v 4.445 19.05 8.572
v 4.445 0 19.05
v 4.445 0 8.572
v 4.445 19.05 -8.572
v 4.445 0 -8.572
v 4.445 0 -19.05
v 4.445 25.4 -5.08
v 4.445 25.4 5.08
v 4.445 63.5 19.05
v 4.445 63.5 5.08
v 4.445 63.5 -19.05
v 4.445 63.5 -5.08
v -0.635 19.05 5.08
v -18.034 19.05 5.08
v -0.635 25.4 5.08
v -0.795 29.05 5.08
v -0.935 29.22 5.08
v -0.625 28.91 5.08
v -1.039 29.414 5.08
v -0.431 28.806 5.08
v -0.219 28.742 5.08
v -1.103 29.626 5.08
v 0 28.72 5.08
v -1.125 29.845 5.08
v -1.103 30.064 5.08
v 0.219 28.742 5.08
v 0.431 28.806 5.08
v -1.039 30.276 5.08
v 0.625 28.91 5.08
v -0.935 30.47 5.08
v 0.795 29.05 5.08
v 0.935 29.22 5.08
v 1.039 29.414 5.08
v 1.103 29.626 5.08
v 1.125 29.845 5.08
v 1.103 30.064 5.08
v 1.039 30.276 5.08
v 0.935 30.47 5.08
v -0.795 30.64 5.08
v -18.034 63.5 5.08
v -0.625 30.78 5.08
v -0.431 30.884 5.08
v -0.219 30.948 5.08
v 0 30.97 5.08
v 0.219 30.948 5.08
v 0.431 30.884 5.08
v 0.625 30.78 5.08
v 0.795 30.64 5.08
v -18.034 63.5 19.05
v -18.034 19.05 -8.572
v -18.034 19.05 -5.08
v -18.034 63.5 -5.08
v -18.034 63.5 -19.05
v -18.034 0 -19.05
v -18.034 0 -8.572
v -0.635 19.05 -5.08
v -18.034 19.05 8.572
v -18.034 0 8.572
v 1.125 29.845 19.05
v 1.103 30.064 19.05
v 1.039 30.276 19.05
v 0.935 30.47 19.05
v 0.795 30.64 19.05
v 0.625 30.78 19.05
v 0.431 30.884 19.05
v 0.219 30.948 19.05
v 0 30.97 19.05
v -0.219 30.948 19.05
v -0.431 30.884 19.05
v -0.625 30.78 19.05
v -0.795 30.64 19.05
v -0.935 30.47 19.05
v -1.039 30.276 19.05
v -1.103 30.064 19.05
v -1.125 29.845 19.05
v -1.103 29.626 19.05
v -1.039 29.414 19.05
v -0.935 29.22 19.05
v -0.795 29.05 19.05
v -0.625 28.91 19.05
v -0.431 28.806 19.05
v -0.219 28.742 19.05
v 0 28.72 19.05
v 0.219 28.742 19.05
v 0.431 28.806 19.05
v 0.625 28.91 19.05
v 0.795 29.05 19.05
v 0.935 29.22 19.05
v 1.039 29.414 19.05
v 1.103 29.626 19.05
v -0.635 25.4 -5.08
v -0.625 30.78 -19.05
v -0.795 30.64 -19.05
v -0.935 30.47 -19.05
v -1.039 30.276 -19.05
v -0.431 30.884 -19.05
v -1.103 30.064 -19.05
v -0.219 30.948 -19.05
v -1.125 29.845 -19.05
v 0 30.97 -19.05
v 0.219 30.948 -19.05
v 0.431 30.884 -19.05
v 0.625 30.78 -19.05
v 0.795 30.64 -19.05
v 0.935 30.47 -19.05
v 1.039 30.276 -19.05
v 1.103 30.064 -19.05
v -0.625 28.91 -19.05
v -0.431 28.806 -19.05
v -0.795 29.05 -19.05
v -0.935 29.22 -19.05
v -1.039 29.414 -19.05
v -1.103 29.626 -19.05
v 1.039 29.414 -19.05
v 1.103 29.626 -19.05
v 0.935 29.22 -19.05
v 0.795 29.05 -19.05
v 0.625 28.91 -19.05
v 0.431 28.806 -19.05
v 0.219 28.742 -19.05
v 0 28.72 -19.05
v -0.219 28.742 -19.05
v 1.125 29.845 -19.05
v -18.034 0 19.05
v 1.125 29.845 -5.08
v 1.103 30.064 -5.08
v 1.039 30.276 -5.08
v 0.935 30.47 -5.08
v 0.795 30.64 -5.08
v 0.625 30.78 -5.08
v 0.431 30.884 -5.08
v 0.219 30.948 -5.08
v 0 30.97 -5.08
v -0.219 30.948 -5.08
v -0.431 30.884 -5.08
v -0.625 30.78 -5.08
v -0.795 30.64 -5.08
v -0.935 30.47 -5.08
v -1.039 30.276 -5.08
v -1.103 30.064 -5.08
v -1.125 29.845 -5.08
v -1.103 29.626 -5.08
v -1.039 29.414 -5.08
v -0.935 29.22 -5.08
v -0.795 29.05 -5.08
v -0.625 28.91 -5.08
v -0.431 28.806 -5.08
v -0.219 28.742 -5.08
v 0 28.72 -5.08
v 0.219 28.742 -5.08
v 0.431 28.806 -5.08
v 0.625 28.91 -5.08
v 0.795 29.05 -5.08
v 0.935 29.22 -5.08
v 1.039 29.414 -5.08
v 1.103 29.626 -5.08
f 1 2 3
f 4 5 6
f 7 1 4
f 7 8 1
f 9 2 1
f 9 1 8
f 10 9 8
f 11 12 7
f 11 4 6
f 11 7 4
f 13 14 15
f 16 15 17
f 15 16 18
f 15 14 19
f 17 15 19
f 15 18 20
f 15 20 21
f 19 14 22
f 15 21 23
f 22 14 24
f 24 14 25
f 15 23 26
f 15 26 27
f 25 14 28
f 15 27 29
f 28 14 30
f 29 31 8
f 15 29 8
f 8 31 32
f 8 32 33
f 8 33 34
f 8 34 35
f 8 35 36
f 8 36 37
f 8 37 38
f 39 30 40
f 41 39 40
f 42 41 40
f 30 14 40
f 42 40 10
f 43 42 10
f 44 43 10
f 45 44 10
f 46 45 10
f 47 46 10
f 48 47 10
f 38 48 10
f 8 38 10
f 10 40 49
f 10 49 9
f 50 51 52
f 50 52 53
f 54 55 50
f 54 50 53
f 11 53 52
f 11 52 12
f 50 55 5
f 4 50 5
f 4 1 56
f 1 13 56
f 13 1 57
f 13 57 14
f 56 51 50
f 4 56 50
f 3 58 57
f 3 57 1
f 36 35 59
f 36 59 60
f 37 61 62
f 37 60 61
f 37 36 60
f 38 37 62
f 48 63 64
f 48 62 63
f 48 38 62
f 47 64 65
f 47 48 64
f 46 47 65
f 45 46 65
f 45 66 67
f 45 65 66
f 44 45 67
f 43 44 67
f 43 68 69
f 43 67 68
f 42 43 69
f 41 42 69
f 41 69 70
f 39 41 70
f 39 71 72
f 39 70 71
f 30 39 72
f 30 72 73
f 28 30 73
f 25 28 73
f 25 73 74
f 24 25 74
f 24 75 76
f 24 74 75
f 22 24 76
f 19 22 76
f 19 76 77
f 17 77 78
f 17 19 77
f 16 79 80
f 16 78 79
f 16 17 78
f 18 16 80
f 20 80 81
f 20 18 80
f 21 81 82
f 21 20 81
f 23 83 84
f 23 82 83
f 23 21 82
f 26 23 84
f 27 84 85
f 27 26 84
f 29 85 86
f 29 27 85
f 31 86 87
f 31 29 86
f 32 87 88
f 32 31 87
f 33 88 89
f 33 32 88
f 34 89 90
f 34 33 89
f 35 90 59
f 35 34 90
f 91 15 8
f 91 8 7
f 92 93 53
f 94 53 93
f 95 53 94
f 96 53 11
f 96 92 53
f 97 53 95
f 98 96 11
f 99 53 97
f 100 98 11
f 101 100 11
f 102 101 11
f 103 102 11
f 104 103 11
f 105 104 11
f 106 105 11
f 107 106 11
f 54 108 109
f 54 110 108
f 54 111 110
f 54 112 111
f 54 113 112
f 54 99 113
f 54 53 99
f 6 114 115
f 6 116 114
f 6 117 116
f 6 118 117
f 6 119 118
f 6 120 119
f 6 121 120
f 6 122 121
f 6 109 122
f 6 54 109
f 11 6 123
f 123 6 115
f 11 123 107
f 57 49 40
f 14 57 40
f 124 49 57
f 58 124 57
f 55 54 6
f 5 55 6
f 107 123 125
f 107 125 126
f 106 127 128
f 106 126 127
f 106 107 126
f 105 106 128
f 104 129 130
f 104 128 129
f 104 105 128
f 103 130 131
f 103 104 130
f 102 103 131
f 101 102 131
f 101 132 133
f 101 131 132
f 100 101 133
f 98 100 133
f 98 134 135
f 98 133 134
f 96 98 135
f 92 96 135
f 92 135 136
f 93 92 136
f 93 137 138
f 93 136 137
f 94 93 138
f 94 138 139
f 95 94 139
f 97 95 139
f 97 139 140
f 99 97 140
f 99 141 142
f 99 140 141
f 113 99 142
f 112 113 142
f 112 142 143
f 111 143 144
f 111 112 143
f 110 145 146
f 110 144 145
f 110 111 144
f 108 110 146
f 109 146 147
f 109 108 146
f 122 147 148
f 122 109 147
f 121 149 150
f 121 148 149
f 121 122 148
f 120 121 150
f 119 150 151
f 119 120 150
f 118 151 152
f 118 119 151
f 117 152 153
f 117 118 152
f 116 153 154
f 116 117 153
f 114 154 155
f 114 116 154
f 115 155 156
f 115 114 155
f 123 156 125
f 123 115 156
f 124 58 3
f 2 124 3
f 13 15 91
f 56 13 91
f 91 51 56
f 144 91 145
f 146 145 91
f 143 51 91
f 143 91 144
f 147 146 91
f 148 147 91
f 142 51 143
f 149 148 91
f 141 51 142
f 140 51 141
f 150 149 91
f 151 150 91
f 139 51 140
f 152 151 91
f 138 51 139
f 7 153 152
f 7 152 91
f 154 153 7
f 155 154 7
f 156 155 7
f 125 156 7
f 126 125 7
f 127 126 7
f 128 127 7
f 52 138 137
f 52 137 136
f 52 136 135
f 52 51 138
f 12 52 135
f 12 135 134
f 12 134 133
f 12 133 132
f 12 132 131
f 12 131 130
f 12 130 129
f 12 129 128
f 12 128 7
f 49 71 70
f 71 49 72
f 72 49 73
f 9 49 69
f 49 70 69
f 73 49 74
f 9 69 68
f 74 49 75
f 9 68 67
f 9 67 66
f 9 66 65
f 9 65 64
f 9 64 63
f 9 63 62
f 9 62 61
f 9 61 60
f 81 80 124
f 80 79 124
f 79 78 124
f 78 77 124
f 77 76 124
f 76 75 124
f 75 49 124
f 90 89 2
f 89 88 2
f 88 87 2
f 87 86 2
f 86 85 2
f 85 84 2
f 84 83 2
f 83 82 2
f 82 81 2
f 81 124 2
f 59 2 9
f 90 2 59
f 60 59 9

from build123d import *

# Parameters (mm, degrees)
SKETCH1_W               = 36.068
SKETCH1_H               = 38.1
BOSS_EXTRUDE1_DEPTH     = 63.5
SKETCH3_W               = 36.068
SKETCH3_H               = 10.16
CUT_EXTRUDE1_DEPTH      = 38.1
SKETCH4_W               = 36.068
SKETCH4_H               = 17.145
CUT_EXTRUDE2_DEPTH      = 19.05
SKETCH5_W               = 17.399
SKETCH5_H               = 10.16
CUT_EXTRUDE3_DEPTH      = 47.257298408
CUT_EXTRUDE4_DEPTH      = 71.283227416
CUT_EXTRUDE4_DEPTH_BACK = 71.283227416
SKETCH6_R               = 1.125
SKETCH7_W               = 13.589
SKETCH7_H               = 38.1
CUT_EXTRUDE6_DEPTH      = 69.705004592
SKETCH8_W               = 10.16
SKETCH8_H               = 6.35
BOSS_EXTRUDE2_DEPTH     = 3.81


with BuildPart() as part:
    # Sketch1 → Boss-Extrude1 (new body)
    with BuildSketch(Plane(origin=(0, 0, 0), x_dir=(1, 0, 0), z_dir=(0, 1, 0))):
        Rectangle(SKETCH1_W, SKETCH1_H)
    extrude(amount=BOSS_EXTRUDE1_DEPTH)

    # Sketch3 → Cut-Extrude1 (cut)
    with BuildSketch(Plane(origin=(0, 63.5, 0), x_dir=(1, 0, 0), z_dir=(0, 1, 0))):
        Rectangle(SKETCH3_W, SKETCH3_H)
    extrude(amount=-CUT_EXTRUDE1_DEPTH, mode=Mode.SUBTRACT)

    # Sketch4 → Cut-Extrude2 (cut)
    with BuildSketch(Plane.XZ):
        Rectangle(SKETCH4_W, SKETCH4_H)
    extrude(amount=-CUT_EXTRUDE2_DEPTH, mode=Mode.SUBTRACT)

    # Sketch5 → Cut-Extrude3 (cut, through all)
    with BuildSketch(Plane(origin=(0, 25.4, 0), x_dir=(1, 0, 0), z_dir=(0, 1, 0))):
        with Locations((-9.3345, 0)):
            Rectangle(SKETCH5_W, SKETCH5_H)
        with Locations((9.3345, 0)):
            Rectangle(SKETCH5_W, SKETCH5_H)
    extrude(amount=-CUT_EXTRUDE3_DEPTH, mode=Mode.SUBTRACT)

    # Sketch6 → Cut-Extrude4 (cut, two sides: drawn at the far end of the back side and taken through both)
    with BuildSketch(Plane.XY.offset(-5.08).offset(-CUT_EXTRUDE4_DEPTH_BACK)):
        with Locations((0, 29.845)):
            Circle(SKETCH6_R)
    extrude(amount=CUT_EXTRUDE4_DEPTH + CUT_EXTRUDE4_DEPTH_BACK, mode=Mode.SUBTRACT)

    # Sketch7 → Cut-Extrude6 (cut, through all)
    with BuildSketch(Plane(origin=(0, 63.5, 0), x_dir=(1, 0, 0), z_dir=(0, 1, 0))):
        with Locations((11.2395, 0)):
            Rectangle(SKETCH7_W, SKETCH7_H)
    extrude(amount=-CUT_EXTRUDE6_DEPTH, mode=Mode.SUBTRACT)

    # Sketch8 → Boss-Extrude2 (add)
    with BuildSketch(Plane(origin=(0.635, 0, 0), x_dir=(0, 0, -1), z_dir=(1, 0, 0))):
        with Locations((0, 22.225)):
            Rectangle(SKETCH8_W, SKETCH8_H)
    extrude(amount=BOSS_EXTRUDE2_DEPTH)


solid = part.part
